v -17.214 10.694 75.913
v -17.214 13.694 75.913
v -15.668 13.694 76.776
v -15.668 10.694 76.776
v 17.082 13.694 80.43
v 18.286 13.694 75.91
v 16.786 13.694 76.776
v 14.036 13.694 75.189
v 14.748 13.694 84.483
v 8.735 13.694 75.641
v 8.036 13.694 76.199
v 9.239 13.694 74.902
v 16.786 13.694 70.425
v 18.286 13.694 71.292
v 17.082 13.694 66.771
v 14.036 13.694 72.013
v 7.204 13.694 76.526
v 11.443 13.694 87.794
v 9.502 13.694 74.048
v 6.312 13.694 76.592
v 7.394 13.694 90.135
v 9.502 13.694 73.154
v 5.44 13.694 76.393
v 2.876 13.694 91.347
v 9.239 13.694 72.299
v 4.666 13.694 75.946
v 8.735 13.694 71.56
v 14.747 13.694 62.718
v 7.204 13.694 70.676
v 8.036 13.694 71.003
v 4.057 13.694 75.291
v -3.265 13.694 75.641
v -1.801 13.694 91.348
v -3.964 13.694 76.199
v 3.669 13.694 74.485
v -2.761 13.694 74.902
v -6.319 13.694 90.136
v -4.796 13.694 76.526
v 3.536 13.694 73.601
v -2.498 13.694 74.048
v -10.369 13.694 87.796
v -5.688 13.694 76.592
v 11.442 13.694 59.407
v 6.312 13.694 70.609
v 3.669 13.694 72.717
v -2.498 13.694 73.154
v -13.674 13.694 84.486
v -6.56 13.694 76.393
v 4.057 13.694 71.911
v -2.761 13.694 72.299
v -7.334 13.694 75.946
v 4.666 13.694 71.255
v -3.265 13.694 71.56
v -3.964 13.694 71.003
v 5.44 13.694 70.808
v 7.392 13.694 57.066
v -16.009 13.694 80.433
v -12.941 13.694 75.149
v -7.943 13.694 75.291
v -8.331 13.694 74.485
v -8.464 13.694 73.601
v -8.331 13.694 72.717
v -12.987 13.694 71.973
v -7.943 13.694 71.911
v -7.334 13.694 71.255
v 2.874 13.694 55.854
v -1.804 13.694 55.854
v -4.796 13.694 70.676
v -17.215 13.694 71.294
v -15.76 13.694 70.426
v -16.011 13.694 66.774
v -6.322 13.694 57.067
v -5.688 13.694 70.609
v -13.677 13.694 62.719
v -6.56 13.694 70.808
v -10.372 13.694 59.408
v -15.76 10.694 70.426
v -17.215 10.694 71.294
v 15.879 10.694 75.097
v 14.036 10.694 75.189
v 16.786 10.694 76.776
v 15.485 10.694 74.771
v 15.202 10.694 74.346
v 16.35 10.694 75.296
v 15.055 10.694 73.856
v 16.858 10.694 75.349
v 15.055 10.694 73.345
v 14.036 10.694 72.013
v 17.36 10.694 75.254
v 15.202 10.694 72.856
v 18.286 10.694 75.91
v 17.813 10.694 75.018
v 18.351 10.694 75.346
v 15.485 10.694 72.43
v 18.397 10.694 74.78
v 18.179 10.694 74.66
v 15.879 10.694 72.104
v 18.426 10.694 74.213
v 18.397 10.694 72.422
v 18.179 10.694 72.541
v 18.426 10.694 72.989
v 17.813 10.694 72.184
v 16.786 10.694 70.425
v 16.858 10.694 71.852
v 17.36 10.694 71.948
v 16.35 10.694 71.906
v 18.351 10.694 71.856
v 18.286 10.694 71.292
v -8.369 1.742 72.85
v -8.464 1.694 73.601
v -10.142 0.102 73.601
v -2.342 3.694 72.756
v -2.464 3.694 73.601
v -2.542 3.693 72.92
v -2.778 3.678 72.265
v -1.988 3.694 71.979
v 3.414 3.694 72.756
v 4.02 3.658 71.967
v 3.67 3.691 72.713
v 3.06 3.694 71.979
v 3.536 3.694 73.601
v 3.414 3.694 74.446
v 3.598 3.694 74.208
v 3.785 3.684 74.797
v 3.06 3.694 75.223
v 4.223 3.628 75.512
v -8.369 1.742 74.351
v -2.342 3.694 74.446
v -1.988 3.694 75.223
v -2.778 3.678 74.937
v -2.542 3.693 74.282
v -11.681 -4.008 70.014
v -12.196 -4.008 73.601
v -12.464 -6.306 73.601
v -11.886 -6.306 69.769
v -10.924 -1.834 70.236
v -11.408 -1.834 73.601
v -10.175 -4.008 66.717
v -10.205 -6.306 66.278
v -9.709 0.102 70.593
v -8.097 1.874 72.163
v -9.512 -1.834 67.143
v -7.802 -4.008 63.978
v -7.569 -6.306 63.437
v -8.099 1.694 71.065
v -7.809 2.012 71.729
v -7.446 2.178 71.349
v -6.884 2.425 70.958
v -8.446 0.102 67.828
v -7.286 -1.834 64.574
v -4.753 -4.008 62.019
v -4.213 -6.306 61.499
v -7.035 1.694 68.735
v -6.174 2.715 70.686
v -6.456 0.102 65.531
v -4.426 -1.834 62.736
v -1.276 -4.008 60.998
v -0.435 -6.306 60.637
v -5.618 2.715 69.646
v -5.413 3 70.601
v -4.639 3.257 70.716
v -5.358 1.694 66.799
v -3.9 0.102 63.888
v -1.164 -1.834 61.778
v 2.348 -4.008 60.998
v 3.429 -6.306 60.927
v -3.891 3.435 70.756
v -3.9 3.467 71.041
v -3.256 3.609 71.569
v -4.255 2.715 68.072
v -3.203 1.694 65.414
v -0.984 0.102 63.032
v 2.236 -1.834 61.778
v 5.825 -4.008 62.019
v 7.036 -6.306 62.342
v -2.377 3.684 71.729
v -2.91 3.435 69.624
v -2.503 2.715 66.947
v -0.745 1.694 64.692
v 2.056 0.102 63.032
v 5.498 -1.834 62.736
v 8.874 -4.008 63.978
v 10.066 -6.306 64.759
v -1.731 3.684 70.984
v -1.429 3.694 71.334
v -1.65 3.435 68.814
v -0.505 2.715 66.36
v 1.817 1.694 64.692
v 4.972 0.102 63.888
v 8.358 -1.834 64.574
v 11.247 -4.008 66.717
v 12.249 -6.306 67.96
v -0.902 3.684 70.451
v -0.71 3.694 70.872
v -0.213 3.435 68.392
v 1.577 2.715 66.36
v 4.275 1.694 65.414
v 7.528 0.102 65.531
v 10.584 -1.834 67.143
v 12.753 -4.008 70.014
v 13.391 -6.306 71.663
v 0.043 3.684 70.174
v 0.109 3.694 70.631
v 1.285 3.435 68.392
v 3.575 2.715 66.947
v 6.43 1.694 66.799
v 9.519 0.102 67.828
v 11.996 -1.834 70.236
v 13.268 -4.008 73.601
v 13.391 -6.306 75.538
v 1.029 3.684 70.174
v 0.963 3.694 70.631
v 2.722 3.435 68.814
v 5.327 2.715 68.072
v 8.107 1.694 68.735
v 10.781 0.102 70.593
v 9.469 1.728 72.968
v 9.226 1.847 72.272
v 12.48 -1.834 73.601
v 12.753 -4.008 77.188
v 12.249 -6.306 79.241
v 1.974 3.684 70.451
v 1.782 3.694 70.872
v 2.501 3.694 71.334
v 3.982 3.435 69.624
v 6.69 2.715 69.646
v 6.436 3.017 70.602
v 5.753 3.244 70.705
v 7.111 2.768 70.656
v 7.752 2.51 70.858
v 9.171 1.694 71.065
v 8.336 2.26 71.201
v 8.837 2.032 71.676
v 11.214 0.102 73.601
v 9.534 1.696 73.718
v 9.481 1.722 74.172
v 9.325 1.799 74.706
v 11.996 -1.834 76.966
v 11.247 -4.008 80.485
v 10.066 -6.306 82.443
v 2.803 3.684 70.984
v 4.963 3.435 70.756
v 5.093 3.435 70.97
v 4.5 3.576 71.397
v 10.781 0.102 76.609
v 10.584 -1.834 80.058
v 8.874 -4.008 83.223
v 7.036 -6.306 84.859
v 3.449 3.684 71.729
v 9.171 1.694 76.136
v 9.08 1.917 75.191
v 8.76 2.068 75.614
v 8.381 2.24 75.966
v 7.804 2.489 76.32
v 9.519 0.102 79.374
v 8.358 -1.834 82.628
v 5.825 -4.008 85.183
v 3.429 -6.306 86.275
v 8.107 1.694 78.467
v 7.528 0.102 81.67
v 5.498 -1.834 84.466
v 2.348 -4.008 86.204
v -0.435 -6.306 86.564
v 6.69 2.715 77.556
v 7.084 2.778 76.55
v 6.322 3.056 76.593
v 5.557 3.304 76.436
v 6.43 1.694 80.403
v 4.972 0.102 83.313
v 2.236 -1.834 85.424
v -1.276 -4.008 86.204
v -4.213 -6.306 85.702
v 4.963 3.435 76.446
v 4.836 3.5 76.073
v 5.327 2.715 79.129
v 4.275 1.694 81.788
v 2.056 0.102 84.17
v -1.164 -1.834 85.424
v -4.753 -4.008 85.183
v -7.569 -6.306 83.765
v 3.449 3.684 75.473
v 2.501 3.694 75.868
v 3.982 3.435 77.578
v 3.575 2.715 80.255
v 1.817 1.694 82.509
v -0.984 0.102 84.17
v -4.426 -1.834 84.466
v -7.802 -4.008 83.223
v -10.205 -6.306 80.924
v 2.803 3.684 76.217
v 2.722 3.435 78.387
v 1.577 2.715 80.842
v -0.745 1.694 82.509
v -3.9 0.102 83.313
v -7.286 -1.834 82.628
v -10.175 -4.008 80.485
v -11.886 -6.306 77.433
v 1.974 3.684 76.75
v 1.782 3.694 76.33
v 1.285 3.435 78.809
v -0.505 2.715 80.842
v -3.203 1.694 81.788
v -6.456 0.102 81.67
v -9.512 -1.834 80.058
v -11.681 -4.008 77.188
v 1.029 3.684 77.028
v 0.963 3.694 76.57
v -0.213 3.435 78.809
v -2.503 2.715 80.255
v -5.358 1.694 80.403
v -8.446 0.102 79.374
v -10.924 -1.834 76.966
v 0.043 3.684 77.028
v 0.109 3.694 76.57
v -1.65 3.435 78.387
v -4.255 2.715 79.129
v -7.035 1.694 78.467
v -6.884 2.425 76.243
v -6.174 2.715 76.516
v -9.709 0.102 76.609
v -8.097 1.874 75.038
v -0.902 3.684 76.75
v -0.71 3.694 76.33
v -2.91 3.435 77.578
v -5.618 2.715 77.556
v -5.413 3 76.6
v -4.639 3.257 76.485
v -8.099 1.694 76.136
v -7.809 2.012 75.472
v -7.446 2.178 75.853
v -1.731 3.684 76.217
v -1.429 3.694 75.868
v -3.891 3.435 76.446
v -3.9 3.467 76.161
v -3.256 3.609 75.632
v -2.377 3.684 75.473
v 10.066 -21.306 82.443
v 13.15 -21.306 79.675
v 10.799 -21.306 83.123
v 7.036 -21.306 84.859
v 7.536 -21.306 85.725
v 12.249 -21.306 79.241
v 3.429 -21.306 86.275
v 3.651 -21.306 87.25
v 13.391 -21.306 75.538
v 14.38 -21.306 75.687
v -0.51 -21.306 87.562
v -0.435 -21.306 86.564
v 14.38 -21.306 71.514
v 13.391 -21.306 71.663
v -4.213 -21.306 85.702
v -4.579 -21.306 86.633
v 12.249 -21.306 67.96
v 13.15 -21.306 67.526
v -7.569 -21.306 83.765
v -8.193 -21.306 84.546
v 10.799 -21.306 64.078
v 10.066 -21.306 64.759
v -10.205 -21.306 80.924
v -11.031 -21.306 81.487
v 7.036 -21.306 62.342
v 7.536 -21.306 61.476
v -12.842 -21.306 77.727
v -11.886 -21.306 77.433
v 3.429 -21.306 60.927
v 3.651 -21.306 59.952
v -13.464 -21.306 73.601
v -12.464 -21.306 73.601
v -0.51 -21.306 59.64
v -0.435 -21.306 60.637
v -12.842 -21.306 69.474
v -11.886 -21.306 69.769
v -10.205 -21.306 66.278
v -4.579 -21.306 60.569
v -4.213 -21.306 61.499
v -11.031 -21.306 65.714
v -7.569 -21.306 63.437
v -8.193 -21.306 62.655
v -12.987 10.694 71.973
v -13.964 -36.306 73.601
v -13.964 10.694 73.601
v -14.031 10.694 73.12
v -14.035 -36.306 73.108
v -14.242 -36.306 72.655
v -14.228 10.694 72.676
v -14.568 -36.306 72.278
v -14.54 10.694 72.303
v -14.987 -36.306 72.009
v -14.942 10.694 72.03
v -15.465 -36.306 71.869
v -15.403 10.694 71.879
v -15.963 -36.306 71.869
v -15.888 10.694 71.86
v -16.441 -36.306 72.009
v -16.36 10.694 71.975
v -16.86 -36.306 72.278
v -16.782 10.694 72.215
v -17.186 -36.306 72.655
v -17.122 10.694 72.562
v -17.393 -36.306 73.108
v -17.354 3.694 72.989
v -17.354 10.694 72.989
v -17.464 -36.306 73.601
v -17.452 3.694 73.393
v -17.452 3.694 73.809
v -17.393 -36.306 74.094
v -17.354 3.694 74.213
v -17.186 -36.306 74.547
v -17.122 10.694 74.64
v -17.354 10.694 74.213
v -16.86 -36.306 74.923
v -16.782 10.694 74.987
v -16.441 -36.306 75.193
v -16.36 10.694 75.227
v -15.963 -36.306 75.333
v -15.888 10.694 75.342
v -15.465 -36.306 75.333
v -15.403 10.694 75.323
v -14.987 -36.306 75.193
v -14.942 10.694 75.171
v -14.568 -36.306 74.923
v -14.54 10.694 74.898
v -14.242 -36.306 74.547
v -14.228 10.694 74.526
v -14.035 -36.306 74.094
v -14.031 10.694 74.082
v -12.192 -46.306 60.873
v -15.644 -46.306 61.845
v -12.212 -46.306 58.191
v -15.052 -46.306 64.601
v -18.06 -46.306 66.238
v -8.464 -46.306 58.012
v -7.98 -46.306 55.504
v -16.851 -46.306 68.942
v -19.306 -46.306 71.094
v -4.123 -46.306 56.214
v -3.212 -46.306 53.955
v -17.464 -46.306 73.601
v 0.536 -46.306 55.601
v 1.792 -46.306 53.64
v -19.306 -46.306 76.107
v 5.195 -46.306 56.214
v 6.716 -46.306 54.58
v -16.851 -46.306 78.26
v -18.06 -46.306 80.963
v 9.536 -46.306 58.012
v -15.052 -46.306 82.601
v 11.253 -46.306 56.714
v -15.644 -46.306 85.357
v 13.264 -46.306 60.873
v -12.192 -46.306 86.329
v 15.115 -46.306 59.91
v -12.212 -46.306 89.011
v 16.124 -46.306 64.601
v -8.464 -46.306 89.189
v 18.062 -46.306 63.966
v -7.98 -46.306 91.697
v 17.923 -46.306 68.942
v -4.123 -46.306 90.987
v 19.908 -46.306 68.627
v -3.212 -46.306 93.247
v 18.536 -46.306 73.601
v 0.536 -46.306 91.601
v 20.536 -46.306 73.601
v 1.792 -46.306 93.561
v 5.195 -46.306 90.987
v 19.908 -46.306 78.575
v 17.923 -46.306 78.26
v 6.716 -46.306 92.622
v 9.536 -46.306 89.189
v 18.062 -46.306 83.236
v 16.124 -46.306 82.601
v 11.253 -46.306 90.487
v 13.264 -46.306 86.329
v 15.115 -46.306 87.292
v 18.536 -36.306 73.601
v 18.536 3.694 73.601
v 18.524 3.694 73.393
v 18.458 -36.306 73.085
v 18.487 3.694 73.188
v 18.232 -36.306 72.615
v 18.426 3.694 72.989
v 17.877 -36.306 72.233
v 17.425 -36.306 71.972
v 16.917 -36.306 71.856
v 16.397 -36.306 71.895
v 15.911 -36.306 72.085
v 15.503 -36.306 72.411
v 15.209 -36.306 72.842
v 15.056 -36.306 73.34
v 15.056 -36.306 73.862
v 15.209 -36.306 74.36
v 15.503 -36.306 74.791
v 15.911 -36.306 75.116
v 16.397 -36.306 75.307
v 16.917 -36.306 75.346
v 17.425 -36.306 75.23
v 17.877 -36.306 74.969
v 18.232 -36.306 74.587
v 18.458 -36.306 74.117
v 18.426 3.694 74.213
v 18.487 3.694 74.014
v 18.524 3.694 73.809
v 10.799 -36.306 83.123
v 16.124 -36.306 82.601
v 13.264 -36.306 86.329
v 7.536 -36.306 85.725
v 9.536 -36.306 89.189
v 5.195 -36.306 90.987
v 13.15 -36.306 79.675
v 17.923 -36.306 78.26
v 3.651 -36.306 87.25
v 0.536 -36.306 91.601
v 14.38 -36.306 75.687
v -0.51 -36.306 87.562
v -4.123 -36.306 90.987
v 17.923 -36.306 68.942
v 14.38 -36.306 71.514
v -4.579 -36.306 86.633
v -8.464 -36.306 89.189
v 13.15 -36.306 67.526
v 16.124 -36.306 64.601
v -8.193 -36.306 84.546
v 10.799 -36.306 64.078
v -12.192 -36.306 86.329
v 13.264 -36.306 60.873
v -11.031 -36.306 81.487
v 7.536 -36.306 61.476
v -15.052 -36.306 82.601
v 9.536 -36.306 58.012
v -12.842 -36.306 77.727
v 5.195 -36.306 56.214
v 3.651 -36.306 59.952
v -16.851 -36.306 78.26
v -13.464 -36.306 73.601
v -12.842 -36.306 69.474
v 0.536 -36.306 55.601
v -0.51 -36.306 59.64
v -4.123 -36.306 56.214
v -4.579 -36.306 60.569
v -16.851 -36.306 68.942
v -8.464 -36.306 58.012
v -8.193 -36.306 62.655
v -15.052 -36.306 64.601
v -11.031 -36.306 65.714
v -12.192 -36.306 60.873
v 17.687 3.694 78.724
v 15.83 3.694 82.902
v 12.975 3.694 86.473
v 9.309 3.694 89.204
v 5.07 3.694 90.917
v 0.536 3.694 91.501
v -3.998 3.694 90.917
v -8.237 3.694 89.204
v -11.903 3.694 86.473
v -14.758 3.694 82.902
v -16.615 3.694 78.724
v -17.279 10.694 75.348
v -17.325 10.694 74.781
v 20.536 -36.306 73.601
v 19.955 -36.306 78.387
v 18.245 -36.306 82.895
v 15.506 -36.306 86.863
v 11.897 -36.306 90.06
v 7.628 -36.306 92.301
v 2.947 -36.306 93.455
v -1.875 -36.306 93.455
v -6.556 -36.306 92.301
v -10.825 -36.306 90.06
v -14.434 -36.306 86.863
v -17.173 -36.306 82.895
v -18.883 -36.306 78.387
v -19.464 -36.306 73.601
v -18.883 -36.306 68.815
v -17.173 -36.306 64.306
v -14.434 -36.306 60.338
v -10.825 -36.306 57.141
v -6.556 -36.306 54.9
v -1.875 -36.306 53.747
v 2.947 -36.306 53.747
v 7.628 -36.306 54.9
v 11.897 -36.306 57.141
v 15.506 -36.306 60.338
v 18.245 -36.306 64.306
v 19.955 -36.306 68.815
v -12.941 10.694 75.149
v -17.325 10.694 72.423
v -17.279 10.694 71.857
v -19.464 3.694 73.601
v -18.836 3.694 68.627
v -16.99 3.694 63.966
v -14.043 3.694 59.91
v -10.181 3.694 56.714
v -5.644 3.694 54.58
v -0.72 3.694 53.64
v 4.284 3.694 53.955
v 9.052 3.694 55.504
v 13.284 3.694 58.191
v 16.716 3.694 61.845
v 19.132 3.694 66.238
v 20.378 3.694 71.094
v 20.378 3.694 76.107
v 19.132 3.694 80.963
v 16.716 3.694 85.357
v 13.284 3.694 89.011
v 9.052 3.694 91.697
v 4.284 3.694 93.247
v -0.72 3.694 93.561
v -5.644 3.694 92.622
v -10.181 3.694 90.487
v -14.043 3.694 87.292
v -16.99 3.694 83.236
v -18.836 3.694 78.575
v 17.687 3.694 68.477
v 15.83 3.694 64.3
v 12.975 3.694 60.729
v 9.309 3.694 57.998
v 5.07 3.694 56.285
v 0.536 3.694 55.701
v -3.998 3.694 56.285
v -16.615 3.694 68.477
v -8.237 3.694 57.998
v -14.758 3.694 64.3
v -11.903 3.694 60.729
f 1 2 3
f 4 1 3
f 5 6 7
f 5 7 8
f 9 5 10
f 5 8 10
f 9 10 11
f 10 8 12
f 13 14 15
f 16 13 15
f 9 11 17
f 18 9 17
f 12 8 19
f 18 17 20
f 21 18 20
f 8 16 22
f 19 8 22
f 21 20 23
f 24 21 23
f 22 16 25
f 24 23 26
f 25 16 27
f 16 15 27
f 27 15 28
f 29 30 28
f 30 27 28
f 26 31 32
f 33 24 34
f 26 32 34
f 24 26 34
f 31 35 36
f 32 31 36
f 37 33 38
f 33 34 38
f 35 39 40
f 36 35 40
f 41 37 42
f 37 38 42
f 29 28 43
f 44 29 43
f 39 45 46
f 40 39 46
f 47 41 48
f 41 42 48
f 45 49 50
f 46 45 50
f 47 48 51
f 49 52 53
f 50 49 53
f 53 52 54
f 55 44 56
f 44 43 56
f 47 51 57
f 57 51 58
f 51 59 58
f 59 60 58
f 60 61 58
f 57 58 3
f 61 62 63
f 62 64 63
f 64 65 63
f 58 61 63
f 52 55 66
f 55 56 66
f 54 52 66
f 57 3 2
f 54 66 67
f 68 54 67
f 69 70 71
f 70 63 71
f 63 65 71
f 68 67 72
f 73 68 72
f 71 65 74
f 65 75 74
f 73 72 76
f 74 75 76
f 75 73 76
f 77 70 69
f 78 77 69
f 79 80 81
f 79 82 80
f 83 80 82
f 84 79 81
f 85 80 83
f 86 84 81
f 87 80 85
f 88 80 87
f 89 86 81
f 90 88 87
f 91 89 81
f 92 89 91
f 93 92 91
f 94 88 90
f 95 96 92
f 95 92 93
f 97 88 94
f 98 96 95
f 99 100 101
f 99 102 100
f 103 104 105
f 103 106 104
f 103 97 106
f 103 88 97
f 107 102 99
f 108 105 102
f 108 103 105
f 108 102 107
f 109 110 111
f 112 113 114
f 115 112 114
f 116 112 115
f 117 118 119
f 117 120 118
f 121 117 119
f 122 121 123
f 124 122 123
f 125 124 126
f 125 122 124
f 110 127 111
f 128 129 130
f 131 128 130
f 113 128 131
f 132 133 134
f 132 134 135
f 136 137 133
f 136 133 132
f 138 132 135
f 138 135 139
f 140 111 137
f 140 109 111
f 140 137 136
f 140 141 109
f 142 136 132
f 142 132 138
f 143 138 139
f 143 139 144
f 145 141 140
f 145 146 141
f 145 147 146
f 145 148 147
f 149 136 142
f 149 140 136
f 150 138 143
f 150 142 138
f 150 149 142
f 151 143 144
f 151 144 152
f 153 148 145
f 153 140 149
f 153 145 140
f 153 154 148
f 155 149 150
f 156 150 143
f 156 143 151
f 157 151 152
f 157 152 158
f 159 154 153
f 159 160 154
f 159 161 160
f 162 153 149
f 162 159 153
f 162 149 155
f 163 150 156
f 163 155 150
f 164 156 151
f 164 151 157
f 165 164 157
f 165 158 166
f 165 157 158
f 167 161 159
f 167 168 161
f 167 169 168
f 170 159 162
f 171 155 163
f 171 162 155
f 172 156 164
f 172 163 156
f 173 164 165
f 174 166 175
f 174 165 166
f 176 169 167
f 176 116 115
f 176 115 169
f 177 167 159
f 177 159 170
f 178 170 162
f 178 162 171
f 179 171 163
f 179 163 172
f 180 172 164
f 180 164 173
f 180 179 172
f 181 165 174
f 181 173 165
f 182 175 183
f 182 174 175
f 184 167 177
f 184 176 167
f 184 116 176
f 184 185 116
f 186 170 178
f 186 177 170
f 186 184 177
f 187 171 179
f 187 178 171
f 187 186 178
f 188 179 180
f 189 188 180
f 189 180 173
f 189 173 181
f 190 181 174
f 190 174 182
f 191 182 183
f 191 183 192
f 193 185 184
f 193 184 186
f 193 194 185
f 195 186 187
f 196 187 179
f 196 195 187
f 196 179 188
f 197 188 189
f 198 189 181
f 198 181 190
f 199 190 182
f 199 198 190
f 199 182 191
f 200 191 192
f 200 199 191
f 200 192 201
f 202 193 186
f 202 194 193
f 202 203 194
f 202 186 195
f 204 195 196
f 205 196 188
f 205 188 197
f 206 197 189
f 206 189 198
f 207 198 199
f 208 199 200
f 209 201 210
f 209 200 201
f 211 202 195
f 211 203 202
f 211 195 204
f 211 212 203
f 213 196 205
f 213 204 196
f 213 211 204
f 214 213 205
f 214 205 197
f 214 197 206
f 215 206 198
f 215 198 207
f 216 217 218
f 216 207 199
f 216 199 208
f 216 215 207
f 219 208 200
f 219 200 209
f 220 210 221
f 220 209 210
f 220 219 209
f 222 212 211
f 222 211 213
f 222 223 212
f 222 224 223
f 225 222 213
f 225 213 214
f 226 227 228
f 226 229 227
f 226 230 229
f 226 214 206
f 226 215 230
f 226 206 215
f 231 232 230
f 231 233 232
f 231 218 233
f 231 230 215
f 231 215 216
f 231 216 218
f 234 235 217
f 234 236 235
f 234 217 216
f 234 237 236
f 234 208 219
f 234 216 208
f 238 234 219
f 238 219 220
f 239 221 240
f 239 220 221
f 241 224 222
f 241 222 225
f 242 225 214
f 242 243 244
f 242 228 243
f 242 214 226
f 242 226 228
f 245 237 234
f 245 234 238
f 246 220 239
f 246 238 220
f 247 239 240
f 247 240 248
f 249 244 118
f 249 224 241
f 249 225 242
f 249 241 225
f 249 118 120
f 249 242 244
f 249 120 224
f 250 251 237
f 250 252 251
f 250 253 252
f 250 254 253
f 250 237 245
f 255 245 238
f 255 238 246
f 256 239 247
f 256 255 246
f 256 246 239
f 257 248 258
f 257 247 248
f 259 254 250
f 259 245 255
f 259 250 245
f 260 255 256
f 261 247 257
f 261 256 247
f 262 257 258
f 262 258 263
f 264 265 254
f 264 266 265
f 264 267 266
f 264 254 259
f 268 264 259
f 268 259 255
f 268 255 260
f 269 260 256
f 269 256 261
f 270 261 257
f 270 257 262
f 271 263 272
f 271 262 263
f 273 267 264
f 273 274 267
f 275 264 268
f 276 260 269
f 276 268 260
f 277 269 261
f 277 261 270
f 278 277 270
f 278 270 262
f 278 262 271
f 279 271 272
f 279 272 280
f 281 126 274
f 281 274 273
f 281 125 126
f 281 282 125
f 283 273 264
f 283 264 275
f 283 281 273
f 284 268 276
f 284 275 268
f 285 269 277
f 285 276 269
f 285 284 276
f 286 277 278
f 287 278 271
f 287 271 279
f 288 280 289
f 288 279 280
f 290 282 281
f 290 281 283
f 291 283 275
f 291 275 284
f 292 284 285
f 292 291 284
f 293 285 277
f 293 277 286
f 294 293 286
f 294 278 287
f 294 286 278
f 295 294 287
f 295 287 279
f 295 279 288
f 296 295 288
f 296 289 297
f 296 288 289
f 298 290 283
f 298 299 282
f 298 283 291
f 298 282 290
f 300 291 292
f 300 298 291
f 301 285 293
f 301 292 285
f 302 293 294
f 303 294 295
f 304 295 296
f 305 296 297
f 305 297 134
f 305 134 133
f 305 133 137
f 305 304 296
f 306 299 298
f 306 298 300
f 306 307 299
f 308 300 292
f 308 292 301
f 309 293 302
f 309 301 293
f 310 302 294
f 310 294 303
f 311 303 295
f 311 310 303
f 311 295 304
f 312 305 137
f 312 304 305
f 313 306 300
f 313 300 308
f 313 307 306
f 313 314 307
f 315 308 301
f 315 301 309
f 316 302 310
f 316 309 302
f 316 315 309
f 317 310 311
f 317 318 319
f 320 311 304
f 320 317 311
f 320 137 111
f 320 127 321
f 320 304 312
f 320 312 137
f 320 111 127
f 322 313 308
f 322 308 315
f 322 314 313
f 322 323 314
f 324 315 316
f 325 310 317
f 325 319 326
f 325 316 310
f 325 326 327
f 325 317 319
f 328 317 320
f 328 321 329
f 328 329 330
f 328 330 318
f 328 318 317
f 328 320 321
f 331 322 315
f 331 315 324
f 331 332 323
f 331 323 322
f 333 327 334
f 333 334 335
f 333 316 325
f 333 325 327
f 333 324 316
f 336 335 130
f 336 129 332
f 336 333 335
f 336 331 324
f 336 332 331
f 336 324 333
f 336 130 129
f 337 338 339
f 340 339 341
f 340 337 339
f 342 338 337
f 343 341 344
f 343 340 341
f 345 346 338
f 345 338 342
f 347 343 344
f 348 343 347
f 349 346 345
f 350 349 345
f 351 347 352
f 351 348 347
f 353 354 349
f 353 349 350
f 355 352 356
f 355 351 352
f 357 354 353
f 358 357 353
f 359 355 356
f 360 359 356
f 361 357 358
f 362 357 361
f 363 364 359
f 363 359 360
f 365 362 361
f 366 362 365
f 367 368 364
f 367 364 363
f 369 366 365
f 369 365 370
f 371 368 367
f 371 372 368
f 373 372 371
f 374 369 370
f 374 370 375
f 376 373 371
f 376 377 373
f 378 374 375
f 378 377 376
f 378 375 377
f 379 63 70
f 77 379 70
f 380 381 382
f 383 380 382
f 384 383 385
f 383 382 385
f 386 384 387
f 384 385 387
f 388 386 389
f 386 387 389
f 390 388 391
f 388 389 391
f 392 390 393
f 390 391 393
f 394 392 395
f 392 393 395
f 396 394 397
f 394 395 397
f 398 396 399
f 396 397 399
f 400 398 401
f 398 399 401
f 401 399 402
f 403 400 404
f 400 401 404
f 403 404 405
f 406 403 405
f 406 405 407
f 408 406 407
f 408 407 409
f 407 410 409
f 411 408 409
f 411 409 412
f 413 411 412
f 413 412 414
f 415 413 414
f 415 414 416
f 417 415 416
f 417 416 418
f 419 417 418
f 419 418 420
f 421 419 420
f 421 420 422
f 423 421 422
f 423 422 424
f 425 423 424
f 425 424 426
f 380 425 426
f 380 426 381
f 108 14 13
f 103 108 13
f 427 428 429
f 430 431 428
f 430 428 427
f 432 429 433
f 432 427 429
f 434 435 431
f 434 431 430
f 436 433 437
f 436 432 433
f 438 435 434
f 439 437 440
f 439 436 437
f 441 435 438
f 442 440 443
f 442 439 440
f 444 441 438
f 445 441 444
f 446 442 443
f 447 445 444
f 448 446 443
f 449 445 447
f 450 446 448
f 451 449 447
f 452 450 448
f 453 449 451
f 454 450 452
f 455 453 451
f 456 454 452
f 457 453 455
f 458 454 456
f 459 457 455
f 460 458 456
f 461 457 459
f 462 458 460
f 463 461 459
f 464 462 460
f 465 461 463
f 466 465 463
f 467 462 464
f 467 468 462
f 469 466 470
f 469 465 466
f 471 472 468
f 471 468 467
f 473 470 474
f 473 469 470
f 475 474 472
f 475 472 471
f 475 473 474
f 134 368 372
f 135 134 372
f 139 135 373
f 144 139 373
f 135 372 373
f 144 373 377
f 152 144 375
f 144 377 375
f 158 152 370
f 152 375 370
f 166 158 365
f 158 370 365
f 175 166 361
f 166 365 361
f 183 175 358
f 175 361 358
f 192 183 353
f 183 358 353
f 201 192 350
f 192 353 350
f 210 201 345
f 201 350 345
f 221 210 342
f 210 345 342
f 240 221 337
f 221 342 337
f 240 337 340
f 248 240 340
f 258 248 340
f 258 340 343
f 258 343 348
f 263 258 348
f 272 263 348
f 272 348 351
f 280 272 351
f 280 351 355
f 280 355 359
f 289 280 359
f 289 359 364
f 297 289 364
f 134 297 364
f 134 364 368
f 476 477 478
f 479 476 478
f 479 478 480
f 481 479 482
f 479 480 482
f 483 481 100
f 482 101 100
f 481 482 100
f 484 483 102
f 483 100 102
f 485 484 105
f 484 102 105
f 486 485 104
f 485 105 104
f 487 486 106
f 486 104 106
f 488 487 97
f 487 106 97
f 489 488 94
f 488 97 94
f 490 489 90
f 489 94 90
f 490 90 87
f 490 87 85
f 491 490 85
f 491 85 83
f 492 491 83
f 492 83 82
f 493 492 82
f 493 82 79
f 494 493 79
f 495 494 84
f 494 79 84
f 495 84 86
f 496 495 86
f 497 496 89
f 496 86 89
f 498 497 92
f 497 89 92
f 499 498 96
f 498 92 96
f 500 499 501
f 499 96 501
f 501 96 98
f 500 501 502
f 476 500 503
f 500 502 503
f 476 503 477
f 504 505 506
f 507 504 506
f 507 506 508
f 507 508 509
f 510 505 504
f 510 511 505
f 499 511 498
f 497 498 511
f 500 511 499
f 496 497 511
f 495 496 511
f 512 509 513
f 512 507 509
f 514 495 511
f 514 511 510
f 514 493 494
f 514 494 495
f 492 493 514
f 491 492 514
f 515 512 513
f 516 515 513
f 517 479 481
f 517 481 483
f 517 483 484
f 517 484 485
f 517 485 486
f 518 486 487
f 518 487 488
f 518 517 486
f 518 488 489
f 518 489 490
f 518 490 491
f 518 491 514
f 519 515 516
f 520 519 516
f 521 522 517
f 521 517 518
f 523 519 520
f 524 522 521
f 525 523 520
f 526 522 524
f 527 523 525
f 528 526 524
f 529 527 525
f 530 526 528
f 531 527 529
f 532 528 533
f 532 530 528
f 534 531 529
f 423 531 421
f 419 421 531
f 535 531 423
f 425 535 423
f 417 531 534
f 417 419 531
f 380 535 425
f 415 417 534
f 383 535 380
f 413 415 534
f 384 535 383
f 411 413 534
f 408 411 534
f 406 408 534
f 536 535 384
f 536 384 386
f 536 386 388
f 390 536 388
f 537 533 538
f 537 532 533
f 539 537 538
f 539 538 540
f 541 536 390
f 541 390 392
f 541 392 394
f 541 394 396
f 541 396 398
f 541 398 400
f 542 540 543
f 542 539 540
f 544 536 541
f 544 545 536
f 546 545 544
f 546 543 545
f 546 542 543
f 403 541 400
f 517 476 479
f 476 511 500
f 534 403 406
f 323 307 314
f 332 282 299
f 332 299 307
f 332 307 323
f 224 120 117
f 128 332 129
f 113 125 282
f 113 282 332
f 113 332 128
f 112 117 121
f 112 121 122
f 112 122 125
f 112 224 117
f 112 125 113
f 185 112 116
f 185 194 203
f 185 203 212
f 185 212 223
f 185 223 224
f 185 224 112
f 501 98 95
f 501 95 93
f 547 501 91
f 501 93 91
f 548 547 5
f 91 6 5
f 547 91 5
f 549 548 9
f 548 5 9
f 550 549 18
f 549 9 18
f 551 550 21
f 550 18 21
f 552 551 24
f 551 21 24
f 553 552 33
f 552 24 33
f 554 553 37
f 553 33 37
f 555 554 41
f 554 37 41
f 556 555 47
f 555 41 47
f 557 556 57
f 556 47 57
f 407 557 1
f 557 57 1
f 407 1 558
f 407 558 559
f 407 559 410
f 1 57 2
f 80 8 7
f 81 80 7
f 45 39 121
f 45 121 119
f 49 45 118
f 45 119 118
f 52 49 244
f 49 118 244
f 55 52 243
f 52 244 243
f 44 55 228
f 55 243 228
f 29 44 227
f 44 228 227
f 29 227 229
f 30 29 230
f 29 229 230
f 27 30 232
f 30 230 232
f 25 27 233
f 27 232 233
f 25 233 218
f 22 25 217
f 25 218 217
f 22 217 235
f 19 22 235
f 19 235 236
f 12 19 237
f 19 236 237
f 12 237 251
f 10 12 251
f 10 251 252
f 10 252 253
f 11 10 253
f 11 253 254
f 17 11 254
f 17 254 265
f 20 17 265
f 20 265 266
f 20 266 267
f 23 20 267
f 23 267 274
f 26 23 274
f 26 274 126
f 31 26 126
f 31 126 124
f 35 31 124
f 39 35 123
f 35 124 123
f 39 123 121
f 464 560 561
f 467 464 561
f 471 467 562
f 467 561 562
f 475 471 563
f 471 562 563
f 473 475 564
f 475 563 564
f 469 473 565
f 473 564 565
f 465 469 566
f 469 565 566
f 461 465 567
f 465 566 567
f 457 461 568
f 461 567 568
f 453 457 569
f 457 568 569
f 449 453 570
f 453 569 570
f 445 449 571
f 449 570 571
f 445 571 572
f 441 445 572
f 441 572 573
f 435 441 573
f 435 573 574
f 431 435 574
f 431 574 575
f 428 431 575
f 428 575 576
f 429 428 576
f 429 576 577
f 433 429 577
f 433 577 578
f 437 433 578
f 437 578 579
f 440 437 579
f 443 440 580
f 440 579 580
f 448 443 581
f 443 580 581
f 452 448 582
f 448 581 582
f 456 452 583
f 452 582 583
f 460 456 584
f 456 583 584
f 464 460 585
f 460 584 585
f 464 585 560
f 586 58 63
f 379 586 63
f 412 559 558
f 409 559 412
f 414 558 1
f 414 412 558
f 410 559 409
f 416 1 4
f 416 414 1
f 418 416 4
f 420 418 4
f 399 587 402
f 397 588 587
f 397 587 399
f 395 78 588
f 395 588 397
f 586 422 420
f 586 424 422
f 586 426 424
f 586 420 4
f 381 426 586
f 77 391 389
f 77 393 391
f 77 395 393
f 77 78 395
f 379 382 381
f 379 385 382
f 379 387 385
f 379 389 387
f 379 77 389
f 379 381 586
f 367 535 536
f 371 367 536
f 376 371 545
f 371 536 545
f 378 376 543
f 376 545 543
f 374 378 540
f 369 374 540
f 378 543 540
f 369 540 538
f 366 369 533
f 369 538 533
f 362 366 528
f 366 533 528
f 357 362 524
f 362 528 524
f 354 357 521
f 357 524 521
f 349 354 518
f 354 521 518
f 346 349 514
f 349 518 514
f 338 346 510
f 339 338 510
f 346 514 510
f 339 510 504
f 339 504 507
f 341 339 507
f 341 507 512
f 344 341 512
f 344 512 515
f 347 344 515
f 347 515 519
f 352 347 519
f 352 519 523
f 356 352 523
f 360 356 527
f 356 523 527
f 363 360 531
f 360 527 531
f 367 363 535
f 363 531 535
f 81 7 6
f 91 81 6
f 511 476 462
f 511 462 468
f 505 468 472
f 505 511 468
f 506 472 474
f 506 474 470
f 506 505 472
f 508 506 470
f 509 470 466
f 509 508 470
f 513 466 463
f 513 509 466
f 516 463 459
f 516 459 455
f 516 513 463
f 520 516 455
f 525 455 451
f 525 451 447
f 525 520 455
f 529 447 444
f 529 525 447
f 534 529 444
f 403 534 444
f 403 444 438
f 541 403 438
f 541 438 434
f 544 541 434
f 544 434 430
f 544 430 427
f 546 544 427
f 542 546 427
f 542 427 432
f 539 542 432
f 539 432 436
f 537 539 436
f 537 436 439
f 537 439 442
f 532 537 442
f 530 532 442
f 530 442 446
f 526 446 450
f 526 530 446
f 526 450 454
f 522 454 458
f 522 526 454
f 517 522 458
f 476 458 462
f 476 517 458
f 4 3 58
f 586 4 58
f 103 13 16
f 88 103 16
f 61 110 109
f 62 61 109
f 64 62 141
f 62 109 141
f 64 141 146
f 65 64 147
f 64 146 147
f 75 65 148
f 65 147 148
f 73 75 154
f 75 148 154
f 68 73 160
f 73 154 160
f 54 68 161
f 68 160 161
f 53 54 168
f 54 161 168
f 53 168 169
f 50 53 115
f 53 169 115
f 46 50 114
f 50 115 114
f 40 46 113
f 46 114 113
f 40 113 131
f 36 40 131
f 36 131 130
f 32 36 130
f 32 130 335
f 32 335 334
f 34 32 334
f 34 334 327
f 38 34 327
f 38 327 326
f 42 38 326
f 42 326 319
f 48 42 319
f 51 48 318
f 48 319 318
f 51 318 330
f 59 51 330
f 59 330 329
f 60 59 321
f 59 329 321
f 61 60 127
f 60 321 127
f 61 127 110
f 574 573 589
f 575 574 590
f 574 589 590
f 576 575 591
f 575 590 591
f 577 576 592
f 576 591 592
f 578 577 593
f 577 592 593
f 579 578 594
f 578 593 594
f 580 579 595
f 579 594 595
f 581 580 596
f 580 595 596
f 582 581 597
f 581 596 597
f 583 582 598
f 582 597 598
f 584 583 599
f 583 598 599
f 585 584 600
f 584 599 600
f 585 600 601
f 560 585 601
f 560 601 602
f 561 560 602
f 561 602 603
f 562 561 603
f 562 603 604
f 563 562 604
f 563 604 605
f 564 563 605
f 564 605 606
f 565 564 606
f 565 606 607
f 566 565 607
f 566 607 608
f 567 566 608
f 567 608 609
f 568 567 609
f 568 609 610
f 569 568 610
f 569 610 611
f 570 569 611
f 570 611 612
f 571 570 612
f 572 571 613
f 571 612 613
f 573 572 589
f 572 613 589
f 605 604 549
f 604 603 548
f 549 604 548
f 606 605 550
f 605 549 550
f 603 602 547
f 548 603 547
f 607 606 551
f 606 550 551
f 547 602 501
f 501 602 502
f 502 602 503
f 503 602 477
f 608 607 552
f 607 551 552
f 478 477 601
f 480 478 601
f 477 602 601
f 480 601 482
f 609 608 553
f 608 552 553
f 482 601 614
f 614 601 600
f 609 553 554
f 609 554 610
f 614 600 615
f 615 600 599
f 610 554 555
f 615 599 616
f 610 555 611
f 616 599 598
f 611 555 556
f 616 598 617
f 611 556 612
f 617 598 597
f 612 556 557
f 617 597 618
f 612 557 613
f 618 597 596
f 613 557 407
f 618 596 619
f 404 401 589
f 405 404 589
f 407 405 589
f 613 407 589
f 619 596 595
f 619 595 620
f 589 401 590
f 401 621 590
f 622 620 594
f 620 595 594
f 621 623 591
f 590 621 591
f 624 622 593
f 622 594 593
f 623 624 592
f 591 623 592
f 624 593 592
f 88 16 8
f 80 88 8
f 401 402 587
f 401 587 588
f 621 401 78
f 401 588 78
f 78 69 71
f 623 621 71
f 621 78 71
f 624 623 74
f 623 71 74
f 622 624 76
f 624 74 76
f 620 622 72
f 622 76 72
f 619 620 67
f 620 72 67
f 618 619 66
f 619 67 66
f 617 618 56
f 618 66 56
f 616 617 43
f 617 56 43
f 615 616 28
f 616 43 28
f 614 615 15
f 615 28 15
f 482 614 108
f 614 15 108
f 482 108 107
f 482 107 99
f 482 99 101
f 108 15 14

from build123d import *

# Parameters (mm, degrees)
SKETCH1_R               = 17.9
BOSS_EXTRUDE1_DEPTH     = 10
SKETCH2_R               = 20
BOSS_EXTRUDE2_DEPTH     = 40
SKETCH3_R               = 1.75
CUT_EXTRUDE1_DEPTH      = 1
CUT_EXTRUDE1_DEPTH_BACK = 119
CUT_EXTRUDE2_DEPTH      = 3
CUT_EXTRUDE4_START      = -10
SKETCH5_R               = 12
CUT_EXTRUDE4_DEPTH      = 43
FILLET1_R               = 10
SKETCH6_R               = 20
SKETCH6_R_2             = 18
BOSS_EXTRUDE3_DEPTH     = 10
SKETCH7_R               = 13
CUT_EXTRUDE5_DEPTH      = 40
FILLET2_R               = 10
SKETCH8_R               = 3
CUT_EXTRUDE6_DEPTH      = 11
CUT_EXTRUDE6_DEPTH_BACK = 51
SKETCH10_R              = 14
CUT_EXTRUDE7_DEPTH      = 15


with BuildPart() as part:
    # Sketch1 → Boss-Extrude1 (new body)
    with BuildSketch(Plane(origin=(0, 13.694359, 0), x_dir=(-1, 0, 0), z_dir=(0, -1, 0))):
        with Locations((-0.536003, -73.600817)):
            Circle(SKETCH1_R)
    extrude(amount=BOSS_EXTRUDE1_DEPTH)

    # Sketch2 → Boss-Extrude2 (add)
    with BuildSketch(Plane(origin=(0, 3.694359, 0), x_dir=(-1, 0, 0), z_dir=(0, -1, 0))):
        with Locations((-0.536003, -73.600817)):
            Circle(SKETCH2_R)
    extrude(amount=BOSS_EXTRUDE2_DEPTH)

    # Sketch3 → Cut-Extrude1 (cut, two sides)
    with BuildSketch(Plane(origin=(0, 81.694359, 0), x_dir=(1, 0, 0), z_dir=(0, 1, 0))) as cut_extrude1_sk:
        with Locations((-15.713997, -73.600817)):
            Circle(SKETCH3_R)
        with Locations((16.786003, -73.600817)):
            Circle(SKETCH3_R)
    extrude(amount=CUT_EXTRUDE1_DEPTH, mode=Mode.SUBTRACT)
    extrude(cut_extrude1_sk.sketch, amount=-CUT_EXTRUDE1_DEPTH_BACK, mode=Mode.SUBTRACT)

    # Sketch4 → Cut-Extrude2 (cut)
    with BuildSketch(Plane(origin=(0, 13.694359, 0), x_dir=(1, 0, 0), z_dir=(0, 1, 0))):
        Polygon((-15.759938, -70.425723), (-18.48668, -72.053056), (-18.440739, -75.22815), (-15.668056, -76.775911), (-12.941314, -75.148578), (-12.987255, -71.973484), align=None)
        Polygon((16.786003, -70.42539), (14.036003, -72.013104), (14.036003, -75.18853), (16.786003, -76.776243), (19.536003, -75.18853), (19.536003, -72.013104), align=None)
    extrude(amount=-CUT_EXTRUDE2_DEPTH, mode=Mode.SUBTRACT)

    # Sketch5 → Cut-Extrude4 (cut)
    with BuildSketch(Plane(origin=(0, 13.694359, 0), x_dir=(1, 0, 0), z_dir=(0, 1, 0)).offset(CUT_EXTRUDE4_START)):
        with Locations((0.536003, -73.600817)):
            Circle(SKETCH5_R)
    extrude(amount=-CUT_EXTRUDE4_DEPTH, mode=Mode.SUBTRACT)

    # Fillet1
    fillet1_edges = [part.edges().sort_by_distance(p)[0] for p in [
        (-11.463997, 3.694359, 73.600817),
    ]]
    fillet(fillet1_edges, radius=FILLET1_R)

    # Sketch6 → Boss-Extrude3 (add)
    with BuildSketch(Plane.XZ.offset(36.305641)):
        with Locations((0.536003, 73.600817)):
            Circle(SKETCH6_R)
        with Locations((0.536003, 73.600817)):
            Circle(SKETCH6_R_2, mode=Mode.SUBTRACT)
    extrude(amount=BOSS_EXTRUDE3_DEPTH)

    # Sketch7 → Cut-Extrude5 (cut)
    with BuildSketch(Plane(origin=(0, -36.305641, 0), x_dir=(-1, 0, 0), z_dir=(0, -1, 0))):
        with Locations((-0.536003, -73.600817)):
            Circle(SKETCH7_R)
    extrude(amount=-CUT_EXTRUDE5_DEPTH, mode=Mode.SUBTRACT)

    # Fillet2
    fillet2_edges = [part.edges().sort_by_distance(p)[0] for p in [
        (13.536003, 3.694359, 73.600817),
    ]]
    fillet(fillet2_edges, radius=FILLET2_R)

    # Sketch8 → Cut-Extrude6 (cut, two sides)
    with BuildSketch(Plane(origin=(0, -36.305641, 0), x_dir=(-1, 0, 0), z_dir=(0, -1, 0))) as cut_extrude6_sk:
        with Locations((5.463997, -73.600817)):
            Circle(SKETCH8_R)
        with Locations((-6.536003, -73.600817)):
            Circle(SKETCH8_R)
    extrude(amount=CUT_EXTRUDE6_DEPTH, mode=Mode.SUBTRACT)
    extrude(cut_extrude6_sk.sketch, amount=-CUT_EXTRUDE6_DEPTH_BACK, mode=Mode.SUBTRACT)

    # Sketch10 → Cut-Extrude7 (cut)
    with BuildSketch(Plane(origin=(0, -36.305641, 0), x_dir=(-1, 0, 0), z_dir=(0, -1, 0))):
        with Locations((-0.536003, -73.600817)):
            Circle(SKETCH10_R)
    extrude(amount=-CUT_EXTRUDE7_DEPTH, mode=Mode.SUBTRACT)


solid = part.part
